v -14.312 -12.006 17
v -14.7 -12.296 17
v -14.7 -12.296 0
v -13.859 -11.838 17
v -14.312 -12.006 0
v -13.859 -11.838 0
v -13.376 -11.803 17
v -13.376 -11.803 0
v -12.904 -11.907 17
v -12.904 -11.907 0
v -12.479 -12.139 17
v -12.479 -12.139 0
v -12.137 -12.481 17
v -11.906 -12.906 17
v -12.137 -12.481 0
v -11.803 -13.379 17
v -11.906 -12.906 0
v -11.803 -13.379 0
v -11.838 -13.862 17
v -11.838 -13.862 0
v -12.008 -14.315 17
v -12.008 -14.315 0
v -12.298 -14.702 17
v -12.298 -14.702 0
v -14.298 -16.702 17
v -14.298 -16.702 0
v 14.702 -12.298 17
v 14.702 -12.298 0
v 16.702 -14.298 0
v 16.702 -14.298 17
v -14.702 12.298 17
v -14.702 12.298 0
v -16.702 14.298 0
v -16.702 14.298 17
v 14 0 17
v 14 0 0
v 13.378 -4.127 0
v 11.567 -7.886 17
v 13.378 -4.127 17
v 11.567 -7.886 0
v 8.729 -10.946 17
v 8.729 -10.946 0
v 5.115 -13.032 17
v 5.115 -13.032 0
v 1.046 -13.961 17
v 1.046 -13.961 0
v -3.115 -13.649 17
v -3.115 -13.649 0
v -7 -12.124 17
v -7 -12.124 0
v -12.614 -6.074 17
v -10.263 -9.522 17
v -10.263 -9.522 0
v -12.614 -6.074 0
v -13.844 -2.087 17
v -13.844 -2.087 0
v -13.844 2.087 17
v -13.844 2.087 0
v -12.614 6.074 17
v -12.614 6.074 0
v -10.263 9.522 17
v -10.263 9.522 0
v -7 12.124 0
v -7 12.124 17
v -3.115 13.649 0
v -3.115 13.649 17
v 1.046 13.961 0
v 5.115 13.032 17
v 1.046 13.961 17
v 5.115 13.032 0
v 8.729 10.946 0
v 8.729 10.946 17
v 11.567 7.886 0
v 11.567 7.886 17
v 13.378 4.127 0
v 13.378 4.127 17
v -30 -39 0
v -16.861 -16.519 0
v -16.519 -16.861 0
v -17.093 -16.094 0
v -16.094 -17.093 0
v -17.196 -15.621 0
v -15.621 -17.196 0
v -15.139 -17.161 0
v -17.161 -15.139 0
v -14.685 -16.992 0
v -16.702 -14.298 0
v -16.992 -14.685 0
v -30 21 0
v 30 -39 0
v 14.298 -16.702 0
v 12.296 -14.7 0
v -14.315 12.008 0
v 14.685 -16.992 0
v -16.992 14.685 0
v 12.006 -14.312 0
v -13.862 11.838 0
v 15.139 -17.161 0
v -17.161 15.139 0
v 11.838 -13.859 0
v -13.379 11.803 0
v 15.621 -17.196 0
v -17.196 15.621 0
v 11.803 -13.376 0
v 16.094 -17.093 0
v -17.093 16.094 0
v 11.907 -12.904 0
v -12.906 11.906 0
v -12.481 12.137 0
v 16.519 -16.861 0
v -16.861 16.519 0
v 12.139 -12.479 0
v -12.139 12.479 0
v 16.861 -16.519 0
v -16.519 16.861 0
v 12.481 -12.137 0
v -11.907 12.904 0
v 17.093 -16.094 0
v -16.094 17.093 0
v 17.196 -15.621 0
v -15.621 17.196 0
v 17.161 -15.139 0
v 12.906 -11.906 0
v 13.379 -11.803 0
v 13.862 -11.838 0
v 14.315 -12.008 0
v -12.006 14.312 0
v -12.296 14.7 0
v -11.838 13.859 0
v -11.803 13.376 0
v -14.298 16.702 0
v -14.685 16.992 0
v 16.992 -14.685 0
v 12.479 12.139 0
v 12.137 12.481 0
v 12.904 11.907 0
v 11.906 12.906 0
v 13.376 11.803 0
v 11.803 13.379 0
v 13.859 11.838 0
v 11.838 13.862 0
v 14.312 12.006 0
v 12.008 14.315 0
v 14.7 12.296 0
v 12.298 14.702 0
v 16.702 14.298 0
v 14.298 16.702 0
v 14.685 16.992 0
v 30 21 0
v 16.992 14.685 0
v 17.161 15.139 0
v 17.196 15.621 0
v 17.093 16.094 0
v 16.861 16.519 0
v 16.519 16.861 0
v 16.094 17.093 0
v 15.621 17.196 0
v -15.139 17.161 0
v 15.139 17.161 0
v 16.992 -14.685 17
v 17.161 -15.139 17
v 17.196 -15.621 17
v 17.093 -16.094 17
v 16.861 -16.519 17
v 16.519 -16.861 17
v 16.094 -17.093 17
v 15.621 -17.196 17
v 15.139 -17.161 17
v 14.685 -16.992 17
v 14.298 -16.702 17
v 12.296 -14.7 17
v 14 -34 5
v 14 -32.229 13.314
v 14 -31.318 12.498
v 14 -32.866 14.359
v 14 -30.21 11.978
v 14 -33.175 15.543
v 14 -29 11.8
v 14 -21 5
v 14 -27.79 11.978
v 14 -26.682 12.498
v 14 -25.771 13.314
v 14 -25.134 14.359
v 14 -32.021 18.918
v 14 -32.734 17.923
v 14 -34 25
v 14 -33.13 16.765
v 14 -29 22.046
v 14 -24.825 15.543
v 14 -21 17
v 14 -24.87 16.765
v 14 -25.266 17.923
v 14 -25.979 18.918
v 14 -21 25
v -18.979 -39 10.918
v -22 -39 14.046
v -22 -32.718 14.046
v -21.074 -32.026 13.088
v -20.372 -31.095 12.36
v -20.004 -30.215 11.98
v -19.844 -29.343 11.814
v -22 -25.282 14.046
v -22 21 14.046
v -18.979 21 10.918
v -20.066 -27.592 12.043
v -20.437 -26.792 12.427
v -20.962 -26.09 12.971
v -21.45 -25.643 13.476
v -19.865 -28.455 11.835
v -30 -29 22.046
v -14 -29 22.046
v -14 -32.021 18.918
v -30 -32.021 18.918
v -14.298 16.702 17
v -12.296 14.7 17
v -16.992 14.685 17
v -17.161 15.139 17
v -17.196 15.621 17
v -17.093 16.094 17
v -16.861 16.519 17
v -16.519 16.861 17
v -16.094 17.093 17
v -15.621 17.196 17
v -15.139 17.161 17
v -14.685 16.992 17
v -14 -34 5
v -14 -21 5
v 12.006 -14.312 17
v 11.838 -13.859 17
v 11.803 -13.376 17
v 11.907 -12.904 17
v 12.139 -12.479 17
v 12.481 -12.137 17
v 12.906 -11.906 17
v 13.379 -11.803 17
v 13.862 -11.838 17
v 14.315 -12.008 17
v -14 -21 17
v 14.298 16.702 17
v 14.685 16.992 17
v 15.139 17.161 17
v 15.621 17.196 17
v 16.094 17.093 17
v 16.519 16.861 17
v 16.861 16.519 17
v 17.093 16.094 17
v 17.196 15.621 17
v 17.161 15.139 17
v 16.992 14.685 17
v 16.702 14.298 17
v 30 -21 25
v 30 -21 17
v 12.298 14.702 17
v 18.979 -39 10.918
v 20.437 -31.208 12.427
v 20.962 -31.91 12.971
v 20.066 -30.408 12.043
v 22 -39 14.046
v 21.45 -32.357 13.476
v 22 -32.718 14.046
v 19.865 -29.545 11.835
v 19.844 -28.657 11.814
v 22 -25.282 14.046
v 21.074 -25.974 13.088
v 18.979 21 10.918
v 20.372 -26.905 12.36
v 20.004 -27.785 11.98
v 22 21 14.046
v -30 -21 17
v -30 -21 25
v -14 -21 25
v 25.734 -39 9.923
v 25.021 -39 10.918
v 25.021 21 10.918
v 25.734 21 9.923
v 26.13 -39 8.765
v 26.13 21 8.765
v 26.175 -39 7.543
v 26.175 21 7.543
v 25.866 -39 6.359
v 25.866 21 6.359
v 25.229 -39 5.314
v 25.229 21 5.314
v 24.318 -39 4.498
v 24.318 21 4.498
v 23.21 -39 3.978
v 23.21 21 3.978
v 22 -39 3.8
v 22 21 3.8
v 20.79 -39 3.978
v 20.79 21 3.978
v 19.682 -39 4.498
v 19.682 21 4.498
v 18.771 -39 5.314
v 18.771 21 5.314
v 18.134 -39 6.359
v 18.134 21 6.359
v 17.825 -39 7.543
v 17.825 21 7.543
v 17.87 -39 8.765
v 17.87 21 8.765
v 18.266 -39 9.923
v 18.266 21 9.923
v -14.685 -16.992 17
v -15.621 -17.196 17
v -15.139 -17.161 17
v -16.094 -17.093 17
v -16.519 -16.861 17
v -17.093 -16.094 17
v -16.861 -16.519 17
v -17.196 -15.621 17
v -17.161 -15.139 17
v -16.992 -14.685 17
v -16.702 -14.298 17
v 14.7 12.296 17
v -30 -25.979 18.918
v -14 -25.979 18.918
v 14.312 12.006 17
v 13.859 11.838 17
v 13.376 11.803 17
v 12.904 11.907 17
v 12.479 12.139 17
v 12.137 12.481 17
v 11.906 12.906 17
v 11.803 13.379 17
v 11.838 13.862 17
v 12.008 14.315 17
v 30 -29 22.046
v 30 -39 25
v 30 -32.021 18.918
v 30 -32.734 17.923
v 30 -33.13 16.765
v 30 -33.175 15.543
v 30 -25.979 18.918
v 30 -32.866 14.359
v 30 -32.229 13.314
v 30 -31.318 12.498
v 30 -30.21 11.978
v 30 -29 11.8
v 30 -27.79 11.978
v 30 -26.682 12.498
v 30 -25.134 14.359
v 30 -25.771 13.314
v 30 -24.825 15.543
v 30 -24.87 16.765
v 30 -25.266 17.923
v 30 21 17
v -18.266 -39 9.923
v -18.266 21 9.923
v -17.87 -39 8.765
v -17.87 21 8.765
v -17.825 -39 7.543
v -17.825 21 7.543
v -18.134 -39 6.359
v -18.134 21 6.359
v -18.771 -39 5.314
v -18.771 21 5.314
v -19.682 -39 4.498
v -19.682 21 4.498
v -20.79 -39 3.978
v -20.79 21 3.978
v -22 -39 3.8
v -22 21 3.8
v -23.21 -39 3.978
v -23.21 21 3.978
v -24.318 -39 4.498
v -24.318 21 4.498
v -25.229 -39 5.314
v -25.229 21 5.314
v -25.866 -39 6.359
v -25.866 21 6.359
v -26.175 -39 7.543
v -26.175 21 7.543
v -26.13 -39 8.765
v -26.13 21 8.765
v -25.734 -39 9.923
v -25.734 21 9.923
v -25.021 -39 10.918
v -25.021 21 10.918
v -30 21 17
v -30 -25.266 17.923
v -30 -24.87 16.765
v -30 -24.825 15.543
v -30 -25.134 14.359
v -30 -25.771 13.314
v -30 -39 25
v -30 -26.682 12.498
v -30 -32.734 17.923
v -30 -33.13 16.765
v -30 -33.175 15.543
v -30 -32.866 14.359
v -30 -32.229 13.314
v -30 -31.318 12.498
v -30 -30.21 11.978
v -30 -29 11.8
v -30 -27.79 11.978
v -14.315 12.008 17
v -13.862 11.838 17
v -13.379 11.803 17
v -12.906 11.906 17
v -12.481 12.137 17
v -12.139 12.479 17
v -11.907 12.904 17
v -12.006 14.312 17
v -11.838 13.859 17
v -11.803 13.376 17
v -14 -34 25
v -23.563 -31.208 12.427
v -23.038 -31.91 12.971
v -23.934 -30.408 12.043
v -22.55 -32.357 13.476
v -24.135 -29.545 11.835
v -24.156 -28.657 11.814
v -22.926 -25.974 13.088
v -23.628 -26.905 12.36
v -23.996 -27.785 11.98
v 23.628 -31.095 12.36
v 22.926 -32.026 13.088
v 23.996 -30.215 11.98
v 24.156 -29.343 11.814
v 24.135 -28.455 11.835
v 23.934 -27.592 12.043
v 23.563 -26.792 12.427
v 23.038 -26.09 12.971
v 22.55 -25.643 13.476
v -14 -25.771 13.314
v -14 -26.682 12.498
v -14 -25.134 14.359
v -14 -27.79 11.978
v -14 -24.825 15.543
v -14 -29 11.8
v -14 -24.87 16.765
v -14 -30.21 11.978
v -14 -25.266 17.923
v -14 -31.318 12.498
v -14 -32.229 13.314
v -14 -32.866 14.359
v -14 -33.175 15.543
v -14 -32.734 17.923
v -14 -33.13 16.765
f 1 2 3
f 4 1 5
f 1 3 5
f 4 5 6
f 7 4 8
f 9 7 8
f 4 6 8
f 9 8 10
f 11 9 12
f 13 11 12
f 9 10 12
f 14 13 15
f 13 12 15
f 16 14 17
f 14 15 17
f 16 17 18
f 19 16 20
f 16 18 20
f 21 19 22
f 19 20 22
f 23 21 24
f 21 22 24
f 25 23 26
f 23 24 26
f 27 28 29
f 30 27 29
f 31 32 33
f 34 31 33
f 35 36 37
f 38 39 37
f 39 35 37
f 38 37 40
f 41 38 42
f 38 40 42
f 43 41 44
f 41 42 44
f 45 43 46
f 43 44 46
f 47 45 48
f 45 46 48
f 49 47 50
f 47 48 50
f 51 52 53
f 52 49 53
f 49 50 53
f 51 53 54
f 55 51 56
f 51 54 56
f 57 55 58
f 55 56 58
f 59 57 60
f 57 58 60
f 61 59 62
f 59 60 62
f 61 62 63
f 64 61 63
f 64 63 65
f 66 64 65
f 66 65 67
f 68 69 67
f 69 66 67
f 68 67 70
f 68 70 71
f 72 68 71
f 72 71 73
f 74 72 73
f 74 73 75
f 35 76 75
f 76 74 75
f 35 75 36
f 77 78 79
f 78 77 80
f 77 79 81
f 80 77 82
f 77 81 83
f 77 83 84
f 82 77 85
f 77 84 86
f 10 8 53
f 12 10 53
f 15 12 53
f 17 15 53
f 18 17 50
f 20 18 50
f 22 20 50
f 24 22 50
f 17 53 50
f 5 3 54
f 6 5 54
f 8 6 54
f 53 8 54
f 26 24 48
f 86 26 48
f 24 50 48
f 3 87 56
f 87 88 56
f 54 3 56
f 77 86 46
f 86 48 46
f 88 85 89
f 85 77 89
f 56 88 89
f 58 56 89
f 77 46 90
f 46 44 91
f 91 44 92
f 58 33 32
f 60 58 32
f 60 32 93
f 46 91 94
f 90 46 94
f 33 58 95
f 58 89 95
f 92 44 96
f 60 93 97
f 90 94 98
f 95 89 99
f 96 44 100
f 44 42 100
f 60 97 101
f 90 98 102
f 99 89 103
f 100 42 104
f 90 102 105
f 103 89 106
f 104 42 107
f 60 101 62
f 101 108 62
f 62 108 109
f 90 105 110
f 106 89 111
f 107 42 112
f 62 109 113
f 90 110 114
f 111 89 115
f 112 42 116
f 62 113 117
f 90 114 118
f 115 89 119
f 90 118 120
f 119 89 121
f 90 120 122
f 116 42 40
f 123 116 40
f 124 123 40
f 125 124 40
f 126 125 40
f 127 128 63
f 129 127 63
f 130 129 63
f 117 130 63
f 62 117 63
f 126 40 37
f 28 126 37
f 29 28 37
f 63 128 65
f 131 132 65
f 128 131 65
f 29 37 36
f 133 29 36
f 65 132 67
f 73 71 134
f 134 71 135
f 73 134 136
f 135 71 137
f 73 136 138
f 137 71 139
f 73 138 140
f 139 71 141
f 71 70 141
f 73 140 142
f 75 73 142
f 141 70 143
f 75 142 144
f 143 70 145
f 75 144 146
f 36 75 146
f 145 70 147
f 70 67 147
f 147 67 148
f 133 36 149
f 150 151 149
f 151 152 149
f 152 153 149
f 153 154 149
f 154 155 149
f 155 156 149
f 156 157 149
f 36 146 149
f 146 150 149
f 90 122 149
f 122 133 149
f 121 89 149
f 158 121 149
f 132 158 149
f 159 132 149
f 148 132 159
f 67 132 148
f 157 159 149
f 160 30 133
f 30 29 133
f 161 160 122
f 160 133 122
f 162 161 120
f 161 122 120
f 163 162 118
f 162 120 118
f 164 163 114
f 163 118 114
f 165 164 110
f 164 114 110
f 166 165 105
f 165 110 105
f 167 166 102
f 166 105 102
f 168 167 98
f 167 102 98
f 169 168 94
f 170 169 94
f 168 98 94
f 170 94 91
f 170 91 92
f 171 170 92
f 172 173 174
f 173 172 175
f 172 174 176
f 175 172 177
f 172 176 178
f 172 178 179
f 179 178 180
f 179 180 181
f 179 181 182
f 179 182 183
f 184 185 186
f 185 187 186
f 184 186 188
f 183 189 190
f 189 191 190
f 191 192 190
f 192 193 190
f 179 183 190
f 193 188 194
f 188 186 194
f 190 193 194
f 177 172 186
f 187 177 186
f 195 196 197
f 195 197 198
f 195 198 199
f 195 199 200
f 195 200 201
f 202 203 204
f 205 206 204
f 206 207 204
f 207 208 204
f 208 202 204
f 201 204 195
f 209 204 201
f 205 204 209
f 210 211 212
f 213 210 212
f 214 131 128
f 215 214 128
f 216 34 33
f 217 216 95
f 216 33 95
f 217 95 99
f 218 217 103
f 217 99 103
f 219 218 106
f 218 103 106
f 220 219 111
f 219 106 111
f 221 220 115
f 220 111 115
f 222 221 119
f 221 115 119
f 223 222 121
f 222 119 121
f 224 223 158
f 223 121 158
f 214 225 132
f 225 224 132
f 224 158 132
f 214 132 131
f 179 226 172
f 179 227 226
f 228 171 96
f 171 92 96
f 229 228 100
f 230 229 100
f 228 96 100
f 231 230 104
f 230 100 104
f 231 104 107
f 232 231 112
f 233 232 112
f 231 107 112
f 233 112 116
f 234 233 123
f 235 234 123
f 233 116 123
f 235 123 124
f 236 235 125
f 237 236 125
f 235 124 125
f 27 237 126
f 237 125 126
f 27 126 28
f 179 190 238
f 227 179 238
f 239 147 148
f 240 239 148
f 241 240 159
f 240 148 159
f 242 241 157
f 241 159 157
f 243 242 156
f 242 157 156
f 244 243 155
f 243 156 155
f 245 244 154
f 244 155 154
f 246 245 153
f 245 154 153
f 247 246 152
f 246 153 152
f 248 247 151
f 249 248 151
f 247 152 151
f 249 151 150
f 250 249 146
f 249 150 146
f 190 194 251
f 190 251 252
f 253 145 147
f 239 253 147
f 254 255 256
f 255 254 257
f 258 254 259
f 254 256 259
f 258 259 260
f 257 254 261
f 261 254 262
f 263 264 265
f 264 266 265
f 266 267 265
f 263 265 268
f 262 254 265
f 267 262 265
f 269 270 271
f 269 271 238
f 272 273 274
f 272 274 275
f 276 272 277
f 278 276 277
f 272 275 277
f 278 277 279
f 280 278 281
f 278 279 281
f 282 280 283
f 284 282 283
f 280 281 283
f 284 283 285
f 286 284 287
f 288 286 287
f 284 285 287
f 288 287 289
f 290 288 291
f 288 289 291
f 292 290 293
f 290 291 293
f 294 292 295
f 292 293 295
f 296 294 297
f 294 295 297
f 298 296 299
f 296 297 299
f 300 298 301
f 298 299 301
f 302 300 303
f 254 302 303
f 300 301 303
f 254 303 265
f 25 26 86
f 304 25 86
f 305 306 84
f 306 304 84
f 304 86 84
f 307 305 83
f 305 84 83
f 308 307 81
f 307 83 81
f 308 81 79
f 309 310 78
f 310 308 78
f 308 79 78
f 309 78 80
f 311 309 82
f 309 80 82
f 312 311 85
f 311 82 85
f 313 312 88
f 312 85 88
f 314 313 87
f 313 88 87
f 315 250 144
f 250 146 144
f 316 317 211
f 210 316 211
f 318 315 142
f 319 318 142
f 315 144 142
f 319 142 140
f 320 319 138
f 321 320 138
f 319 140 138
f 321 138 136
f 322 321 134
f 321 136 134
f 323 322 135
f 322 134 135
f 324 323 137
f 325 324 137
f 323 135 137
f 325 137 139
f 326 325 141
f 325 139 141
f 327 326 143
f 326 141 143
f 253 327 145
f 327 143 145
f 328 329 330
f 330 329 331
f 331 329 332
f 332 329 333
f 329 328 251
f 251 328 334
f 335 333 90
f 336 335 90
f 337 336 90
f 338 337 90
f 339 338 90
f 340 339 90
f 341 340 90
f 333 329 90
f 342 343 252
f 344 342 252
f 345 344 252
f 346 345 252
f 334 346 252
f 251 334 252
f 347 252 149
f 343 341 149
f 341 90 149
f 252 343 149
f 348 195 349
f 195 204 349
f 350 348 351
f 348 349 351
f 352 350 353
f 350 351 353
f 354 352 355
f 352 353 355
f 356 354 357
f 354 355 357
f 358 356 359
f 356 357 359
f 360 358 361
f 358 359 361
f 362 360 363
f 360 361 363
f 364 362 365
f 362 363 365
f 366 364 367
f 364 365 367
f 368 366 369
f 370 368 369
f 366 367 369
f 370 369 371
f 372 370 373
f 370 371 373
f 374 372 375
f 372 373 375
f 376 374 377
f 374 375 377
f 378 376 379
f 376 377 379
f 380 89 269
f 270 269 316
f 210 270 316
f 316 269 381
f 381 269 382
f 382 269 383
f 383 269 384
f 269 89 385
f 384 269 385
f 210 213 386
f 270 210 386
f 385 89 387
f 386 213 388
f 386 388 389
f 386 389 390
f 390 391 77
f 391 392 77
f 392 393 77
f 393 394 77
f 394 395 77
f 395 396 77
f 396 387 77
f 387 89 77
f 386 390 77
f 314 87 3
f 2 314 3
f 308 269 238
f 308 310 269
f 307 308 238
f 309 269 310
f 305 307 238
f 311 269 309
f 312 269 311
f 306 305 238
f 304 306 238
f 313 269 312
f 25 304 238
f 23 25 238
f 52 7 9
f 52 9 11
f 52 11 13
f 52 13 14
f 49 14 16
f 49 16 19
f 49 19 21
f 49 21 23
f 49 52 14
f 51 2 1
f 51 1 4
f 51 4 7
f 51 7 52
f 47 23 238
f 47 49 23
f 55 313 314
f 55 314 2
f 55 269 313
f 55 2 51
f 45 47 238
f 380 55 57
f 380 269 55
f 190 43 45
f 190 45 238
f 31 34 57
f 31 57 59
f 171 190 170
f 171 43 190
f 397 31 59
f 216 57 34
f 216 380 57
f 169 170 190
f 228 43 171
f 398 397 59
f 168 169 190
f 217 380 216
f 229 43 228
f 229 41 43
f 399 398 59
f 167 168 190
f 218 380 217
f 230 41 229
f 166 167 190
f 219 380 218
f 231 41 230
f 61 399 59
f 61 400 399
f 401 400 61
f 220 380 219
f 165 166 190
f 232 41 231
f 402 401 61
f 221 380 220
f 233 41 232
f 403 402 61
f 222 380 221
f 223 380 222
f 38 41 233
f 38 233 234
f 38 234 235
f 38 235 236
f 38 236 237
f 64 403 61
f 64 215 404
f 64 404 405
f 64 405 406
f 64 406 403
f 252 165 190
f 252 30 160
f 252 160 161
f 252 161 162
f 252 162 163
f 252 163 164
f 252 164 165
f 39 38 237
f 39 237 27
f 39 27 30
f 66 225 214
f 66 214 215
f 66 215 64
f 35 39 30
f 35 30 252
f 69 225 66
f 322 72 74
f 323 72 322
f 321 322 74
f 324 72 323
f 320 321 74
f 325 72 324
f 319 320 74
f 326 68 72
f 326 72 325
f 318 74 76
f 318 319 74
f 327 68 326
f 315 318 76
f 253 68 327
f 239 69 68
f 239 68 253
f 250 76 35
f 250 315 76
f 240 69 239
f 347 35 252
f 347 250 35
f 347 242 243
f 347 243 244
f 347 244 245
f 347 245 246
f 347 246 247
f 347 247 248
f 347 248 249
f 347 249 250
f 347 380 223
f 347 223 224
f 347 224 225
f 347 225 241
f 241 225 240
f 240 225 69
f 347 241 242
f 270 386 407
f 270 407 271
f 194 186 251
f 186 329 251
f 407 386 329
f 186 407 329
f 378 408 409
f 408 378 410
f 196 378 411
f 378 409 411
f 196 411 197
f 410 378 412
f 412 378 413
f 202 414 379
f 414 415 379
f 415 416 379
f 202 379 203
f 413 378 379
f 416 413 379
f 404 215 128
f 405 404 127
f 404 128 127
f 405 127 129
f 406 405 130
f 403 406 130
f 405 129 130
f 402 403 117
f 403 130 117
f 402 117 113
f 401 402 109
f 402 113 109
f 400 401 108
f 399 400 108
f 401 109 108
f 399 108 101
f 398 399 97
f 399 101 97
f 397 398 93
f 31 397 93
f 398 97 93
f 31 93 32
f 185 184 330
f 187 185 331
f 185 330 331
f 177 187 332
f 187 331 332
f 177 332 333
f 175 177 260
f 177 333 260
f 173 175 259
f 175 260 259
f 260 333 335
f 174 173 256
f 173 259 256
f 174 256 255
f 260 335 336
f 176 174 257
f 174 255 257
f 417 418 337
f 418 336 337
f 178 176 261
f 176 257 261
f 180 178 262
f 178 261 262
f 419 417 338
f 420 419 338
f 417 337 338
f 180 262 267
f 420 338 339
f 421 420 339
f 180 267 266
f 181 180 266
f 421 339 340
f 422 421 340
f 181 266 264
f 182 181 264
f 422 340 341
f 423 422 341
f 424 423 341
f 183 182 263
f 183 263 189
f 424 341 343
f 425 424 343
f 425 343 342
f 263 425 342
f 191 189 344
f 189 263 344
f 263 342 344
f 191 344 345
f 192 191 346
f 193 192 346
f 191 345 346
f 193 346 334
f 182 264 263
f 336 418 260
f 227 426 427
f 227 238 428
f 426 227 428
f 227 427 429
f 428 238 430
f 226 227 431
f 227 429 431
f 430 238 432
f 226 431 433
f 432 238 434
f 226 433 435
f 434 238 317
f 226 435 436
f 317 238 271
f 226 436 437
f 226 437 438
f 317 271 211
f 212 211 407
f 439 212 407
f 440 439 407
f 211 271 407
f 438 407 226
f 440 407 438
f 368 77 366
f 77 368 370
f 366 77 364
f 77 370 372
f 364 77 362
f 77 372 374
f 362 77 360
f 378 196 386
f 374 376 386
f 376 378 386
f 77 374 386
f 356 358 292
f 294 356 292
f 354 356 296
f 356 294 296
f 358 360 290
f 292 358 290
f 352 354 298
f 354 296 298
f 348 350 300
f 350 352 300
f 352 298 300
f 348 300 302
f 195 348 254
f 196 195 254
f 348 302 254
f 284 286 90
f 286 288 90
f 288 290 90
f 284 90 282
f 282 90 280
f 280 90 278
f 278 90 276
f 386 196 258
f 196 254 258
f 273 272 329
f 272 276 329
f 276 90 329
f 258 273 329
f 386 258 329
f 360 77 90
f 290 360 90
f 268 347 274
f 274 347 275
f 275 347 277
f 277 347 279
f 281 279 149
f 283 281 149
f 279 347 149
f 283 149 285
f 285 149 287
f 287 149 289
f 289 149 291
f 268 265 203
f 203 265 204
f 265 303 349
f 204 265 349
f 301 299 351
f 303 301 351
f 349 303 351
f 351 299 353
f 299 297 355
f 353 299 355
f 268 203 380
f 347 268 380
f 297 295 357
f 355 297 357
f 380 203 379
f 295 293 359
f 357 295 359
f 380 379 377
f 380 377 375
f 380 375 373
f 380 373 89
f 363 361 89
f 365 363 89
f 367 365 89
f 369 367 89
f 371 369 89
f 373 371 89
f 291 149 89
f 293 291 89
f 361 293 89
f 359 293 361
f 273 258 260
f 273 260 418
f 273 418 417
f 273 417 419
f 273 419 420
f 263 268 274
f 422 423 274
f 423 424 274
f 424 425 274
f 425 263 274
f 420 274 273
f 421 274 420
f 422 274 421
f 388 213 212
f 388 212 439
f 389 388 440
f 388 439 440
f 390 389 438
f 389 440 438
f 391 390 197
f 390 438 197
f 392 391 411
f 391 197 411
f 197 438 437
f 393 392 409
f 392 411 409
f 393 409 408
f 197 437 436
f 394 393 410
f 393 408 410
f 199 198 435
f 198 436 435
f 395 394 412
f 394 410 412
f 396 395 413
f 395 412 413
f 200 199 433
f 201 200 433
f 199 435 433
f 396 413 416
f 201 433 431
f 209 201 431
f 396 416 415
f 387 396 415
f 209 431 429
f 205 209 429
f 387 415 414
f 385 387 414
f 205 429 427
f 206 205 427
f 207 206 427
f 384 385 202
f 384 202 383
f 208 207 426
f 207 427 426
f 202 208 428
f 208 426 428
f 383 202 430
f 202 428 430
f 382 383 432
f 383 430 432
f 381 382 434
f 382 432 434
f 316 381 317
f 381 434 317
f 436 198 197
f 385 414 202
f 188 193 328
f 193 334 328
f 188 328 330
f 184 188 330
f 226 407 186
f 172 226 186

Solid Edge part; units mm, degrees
sketch "Sketch1" plane through (0, 0, 0) normal (0, 0, 1) x (1, 0, 0)
  circle A0 centre (-15.5, 15.5) radius 1.7
  circle A1 centre (15.5, 15.5) radius 1.7
  circle A2 centre (15.5, -15.5) radius 1.7
  circle A3 centre (-15.5, -15.5) radius 1.7
  line L0 (-30, -21) -> (30, -21)
  line L1 (30, -21) -> (30, 21)
  line L2 (30, 21) -> (-30, 21)
  line L3 (-30, 21) -> (-30, -21)
  circle A4 centre (0, 0) radius 14
  dimension "D1" = 42
  dimension "D2" = 60
extrude "Protrusion1" add sketch "Sketch1" along normal blind 17
sketch "Sketch2" plane through (30, 0, 8.5) normal (1, 0, 0) x (0, 1, 0)
  line L0 (-21, -8.5) -> (-39, -8.5)
  line L1 (-39, -8.5) -> (-39, 16.5)
  line L2 (-39, 16.5) -> (-21, 16.5)
  line L3 (-21, 16.5) -> (-21, -8.5)
  dimension "D1" = 18
  dimension "D2" = 25
extrude "Protrusion2" add sketch "Sketch2" against normal up to vertex (60 mm away)
sketch "Sketch3" plane through (0, 21, 8.5) normal (0, 1, 0) x (-1, 0, 0)
  line L0 (-22, 5.5461) -> (-25.0212, 2.4176)
  line L1 (-18.9788, 2.4176) -> (-22, 5.5461)
  arc A0 (-25.0212, 2.4176) -> (-18.9788, 2.4176) centre (-22, -0.5) ccw
  line L2 (22, 5.5461) -> (18.9788, 2.4176)
  line L3 (25.0212, 2.4176) -> (22, 5.5461)
  arc A1 (18.9788, 2.4176) -> (25.0212, 2.4176) centre (22, -0.5) ccw
  dimension "D1" = 8
  dimension "D2" = 8.4
  dimension "D3" = 8.4
  dimension "D4" = 8
  dimension "D5" = 8
extrude "Cutout1" cut sketch "Sketch3" against normal through all
sketch "Sketch4" plane through (30, -8, 12.5) normal (1, 0, 0) x (0, 1, 0)
  line L0 (-17.9788, 6.4176) -> (-21, 9.5461)
  line L1 (-21, 9.5461) -> (-24.0212, 6.4176)
  arc A0 (-24.0212, 6.4176) -> (-17.9788, 6.4176) centre (-21, 3.5) ccw
extrude "Cutout2" cut sketch "Sketch4" against normal through all
sketch "Sketch5" plane through (0, -30, 25) normal (0, 0, 1) x (0, -1, 0)
  line L0 (-9, -14) -> (4, -14)
  line L1 (4, -14) -> (4, 14)
  line L2 (4, 14) -> (-9, 14)
  line L3 (-9, 14) -> (-9, -14)
extrude "ExtrudedCutout_3" cut sketch "Sketch5" against normal blind 20
sketch "Sketch6" plane through (0, -9, 0) normal (0, 0, -1) x (0, 1, 0)
  line L0 (23.2979, 16.7021) -> (21.2958, 14.7)
  arc A0 (21.2958, 14.7) -> (23.7021, 12.2979) centre (22.499, 13.499) ccw
  line L1 (23.7021, 12.2979) -> (25.7021, 14.2979)
  line L2 (23.2979, 16.7021) -> (25.7021, 14.2979)
  line L3 (25.7021, -14.2979) -> (23.7, -12.2958)
  arc A1 (23.7, -12.2958) -> (21.2979, -14.7021) centre (22.499, -13.499) ccw
  line L4 (21.2979, -14.7021) -> (23.2979, -16.7021)
  arc A2 (25.7021, -14.2979) -> (23.2979, -16.7021) centre (24.5, -15.5) ccw
  line L5 (-5.2979, -16.7021) -> (-3.2958, -14.7)
  arc A3 (-3.2958, -14.7) -> (-5.7021, -12.2979) centre (-4.499, -13.499) ccw
  line L6 (-5.7021, -12.2979) -> (-7.7021, -14.2979)
  arc A4 (-5.2979, -16.7021) -> (-7.7021, -14.2979) centre (-6.5, -15.5) ccw
  line L7 (-7.7021, 14.2979) -> (-5.7, 12.2958)
  arc A5 (-5.7, 12.2958) -> (-3.2979, 14.7021) centre (-4.499, 13.499) ccw
  line L8 (-3.2979, 14.7021) -> (-5.2979, 16.7021)
  arc A6 (-7.7021, 14.2979) -> (-5.2979, 16.7021) centre (-6.5, 15.5) ccw
extrude "Cutout3" cut sketch "Sketch6" against normal through all
